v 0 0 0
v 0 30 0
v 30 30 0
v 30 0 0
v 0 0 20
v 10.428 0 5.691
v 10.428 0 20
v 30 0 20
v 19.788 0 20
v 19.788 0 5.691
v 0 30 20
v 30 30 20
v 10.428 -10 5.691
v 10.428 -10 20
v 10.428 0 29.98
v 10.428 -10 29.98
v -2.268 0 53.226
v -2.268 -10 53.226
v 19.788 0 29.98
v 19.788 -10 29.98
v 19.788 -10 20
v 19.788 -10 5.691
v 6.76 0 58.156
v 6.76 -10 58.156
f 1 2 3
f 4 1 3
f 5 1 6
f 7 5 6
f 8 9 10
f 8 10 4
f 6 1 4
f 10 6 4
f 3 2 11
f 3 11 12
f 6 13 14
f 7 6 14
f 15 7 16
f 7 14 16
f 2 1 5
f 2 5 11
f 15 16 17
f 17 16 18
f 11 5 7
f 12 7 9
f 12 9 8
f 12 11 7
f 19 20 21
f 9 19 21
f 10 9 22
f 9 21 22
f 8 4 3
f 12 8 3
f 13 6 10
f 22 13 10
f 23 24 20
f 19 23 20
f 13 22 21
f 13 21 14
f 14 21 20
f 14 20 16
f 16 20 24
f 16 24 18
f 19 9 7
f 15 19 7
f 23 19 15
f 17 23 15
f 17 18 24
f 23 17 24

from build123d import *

# Parameters (mm, degrees)
SKETCH1_W           = 30
SKETCH1_H           = 30
BOSS_EXTRUDE1_DEPTH = 20
SKETCH2_W           = 9.360375711
SKETCH2_H           = 14.309479907
BOSS_EXTRUDE2_DEPTH = 10
BOSS_EXTRUDE3_DEPTH = 10


with BuildPart() as part:
    # Sketch1 → Boss-Extrude1 (new body)
    with BuildSketch(Plane.XY):
        with Locations((15, 15)):
            Rectangle(SKETCH1_W, SKETCH1_H)
    extrude(amount=BOSS_EXTRUDE1_DEPTH)

    # Sketch2 → Boss-Extrude2 (add)
    with BuildSketch(Plane.XZ):
        with Locations((15.108123152, 12.845260046)):
            Rectangle(SKETCH2_W, SKETCH2_H)
    extrude(amount=BOSS_EXTRUDE2_DEPTH)

    # Sketch3 → Boss-Extrude3 (add)
    with BuildSketch(Plane.XZ.offset(10)):
        Polygon((10.427935296, 29.980050477), (-2.268076866, 53.225538566), (6.759662186, 58.156228099), (19.788311007, 29.980050477), (19.788311007, 20), (10.427935296, 20), align=None)
    extrude(amount=-BOSS_EXTRUDE3_DEPTH)


solid = part.part
